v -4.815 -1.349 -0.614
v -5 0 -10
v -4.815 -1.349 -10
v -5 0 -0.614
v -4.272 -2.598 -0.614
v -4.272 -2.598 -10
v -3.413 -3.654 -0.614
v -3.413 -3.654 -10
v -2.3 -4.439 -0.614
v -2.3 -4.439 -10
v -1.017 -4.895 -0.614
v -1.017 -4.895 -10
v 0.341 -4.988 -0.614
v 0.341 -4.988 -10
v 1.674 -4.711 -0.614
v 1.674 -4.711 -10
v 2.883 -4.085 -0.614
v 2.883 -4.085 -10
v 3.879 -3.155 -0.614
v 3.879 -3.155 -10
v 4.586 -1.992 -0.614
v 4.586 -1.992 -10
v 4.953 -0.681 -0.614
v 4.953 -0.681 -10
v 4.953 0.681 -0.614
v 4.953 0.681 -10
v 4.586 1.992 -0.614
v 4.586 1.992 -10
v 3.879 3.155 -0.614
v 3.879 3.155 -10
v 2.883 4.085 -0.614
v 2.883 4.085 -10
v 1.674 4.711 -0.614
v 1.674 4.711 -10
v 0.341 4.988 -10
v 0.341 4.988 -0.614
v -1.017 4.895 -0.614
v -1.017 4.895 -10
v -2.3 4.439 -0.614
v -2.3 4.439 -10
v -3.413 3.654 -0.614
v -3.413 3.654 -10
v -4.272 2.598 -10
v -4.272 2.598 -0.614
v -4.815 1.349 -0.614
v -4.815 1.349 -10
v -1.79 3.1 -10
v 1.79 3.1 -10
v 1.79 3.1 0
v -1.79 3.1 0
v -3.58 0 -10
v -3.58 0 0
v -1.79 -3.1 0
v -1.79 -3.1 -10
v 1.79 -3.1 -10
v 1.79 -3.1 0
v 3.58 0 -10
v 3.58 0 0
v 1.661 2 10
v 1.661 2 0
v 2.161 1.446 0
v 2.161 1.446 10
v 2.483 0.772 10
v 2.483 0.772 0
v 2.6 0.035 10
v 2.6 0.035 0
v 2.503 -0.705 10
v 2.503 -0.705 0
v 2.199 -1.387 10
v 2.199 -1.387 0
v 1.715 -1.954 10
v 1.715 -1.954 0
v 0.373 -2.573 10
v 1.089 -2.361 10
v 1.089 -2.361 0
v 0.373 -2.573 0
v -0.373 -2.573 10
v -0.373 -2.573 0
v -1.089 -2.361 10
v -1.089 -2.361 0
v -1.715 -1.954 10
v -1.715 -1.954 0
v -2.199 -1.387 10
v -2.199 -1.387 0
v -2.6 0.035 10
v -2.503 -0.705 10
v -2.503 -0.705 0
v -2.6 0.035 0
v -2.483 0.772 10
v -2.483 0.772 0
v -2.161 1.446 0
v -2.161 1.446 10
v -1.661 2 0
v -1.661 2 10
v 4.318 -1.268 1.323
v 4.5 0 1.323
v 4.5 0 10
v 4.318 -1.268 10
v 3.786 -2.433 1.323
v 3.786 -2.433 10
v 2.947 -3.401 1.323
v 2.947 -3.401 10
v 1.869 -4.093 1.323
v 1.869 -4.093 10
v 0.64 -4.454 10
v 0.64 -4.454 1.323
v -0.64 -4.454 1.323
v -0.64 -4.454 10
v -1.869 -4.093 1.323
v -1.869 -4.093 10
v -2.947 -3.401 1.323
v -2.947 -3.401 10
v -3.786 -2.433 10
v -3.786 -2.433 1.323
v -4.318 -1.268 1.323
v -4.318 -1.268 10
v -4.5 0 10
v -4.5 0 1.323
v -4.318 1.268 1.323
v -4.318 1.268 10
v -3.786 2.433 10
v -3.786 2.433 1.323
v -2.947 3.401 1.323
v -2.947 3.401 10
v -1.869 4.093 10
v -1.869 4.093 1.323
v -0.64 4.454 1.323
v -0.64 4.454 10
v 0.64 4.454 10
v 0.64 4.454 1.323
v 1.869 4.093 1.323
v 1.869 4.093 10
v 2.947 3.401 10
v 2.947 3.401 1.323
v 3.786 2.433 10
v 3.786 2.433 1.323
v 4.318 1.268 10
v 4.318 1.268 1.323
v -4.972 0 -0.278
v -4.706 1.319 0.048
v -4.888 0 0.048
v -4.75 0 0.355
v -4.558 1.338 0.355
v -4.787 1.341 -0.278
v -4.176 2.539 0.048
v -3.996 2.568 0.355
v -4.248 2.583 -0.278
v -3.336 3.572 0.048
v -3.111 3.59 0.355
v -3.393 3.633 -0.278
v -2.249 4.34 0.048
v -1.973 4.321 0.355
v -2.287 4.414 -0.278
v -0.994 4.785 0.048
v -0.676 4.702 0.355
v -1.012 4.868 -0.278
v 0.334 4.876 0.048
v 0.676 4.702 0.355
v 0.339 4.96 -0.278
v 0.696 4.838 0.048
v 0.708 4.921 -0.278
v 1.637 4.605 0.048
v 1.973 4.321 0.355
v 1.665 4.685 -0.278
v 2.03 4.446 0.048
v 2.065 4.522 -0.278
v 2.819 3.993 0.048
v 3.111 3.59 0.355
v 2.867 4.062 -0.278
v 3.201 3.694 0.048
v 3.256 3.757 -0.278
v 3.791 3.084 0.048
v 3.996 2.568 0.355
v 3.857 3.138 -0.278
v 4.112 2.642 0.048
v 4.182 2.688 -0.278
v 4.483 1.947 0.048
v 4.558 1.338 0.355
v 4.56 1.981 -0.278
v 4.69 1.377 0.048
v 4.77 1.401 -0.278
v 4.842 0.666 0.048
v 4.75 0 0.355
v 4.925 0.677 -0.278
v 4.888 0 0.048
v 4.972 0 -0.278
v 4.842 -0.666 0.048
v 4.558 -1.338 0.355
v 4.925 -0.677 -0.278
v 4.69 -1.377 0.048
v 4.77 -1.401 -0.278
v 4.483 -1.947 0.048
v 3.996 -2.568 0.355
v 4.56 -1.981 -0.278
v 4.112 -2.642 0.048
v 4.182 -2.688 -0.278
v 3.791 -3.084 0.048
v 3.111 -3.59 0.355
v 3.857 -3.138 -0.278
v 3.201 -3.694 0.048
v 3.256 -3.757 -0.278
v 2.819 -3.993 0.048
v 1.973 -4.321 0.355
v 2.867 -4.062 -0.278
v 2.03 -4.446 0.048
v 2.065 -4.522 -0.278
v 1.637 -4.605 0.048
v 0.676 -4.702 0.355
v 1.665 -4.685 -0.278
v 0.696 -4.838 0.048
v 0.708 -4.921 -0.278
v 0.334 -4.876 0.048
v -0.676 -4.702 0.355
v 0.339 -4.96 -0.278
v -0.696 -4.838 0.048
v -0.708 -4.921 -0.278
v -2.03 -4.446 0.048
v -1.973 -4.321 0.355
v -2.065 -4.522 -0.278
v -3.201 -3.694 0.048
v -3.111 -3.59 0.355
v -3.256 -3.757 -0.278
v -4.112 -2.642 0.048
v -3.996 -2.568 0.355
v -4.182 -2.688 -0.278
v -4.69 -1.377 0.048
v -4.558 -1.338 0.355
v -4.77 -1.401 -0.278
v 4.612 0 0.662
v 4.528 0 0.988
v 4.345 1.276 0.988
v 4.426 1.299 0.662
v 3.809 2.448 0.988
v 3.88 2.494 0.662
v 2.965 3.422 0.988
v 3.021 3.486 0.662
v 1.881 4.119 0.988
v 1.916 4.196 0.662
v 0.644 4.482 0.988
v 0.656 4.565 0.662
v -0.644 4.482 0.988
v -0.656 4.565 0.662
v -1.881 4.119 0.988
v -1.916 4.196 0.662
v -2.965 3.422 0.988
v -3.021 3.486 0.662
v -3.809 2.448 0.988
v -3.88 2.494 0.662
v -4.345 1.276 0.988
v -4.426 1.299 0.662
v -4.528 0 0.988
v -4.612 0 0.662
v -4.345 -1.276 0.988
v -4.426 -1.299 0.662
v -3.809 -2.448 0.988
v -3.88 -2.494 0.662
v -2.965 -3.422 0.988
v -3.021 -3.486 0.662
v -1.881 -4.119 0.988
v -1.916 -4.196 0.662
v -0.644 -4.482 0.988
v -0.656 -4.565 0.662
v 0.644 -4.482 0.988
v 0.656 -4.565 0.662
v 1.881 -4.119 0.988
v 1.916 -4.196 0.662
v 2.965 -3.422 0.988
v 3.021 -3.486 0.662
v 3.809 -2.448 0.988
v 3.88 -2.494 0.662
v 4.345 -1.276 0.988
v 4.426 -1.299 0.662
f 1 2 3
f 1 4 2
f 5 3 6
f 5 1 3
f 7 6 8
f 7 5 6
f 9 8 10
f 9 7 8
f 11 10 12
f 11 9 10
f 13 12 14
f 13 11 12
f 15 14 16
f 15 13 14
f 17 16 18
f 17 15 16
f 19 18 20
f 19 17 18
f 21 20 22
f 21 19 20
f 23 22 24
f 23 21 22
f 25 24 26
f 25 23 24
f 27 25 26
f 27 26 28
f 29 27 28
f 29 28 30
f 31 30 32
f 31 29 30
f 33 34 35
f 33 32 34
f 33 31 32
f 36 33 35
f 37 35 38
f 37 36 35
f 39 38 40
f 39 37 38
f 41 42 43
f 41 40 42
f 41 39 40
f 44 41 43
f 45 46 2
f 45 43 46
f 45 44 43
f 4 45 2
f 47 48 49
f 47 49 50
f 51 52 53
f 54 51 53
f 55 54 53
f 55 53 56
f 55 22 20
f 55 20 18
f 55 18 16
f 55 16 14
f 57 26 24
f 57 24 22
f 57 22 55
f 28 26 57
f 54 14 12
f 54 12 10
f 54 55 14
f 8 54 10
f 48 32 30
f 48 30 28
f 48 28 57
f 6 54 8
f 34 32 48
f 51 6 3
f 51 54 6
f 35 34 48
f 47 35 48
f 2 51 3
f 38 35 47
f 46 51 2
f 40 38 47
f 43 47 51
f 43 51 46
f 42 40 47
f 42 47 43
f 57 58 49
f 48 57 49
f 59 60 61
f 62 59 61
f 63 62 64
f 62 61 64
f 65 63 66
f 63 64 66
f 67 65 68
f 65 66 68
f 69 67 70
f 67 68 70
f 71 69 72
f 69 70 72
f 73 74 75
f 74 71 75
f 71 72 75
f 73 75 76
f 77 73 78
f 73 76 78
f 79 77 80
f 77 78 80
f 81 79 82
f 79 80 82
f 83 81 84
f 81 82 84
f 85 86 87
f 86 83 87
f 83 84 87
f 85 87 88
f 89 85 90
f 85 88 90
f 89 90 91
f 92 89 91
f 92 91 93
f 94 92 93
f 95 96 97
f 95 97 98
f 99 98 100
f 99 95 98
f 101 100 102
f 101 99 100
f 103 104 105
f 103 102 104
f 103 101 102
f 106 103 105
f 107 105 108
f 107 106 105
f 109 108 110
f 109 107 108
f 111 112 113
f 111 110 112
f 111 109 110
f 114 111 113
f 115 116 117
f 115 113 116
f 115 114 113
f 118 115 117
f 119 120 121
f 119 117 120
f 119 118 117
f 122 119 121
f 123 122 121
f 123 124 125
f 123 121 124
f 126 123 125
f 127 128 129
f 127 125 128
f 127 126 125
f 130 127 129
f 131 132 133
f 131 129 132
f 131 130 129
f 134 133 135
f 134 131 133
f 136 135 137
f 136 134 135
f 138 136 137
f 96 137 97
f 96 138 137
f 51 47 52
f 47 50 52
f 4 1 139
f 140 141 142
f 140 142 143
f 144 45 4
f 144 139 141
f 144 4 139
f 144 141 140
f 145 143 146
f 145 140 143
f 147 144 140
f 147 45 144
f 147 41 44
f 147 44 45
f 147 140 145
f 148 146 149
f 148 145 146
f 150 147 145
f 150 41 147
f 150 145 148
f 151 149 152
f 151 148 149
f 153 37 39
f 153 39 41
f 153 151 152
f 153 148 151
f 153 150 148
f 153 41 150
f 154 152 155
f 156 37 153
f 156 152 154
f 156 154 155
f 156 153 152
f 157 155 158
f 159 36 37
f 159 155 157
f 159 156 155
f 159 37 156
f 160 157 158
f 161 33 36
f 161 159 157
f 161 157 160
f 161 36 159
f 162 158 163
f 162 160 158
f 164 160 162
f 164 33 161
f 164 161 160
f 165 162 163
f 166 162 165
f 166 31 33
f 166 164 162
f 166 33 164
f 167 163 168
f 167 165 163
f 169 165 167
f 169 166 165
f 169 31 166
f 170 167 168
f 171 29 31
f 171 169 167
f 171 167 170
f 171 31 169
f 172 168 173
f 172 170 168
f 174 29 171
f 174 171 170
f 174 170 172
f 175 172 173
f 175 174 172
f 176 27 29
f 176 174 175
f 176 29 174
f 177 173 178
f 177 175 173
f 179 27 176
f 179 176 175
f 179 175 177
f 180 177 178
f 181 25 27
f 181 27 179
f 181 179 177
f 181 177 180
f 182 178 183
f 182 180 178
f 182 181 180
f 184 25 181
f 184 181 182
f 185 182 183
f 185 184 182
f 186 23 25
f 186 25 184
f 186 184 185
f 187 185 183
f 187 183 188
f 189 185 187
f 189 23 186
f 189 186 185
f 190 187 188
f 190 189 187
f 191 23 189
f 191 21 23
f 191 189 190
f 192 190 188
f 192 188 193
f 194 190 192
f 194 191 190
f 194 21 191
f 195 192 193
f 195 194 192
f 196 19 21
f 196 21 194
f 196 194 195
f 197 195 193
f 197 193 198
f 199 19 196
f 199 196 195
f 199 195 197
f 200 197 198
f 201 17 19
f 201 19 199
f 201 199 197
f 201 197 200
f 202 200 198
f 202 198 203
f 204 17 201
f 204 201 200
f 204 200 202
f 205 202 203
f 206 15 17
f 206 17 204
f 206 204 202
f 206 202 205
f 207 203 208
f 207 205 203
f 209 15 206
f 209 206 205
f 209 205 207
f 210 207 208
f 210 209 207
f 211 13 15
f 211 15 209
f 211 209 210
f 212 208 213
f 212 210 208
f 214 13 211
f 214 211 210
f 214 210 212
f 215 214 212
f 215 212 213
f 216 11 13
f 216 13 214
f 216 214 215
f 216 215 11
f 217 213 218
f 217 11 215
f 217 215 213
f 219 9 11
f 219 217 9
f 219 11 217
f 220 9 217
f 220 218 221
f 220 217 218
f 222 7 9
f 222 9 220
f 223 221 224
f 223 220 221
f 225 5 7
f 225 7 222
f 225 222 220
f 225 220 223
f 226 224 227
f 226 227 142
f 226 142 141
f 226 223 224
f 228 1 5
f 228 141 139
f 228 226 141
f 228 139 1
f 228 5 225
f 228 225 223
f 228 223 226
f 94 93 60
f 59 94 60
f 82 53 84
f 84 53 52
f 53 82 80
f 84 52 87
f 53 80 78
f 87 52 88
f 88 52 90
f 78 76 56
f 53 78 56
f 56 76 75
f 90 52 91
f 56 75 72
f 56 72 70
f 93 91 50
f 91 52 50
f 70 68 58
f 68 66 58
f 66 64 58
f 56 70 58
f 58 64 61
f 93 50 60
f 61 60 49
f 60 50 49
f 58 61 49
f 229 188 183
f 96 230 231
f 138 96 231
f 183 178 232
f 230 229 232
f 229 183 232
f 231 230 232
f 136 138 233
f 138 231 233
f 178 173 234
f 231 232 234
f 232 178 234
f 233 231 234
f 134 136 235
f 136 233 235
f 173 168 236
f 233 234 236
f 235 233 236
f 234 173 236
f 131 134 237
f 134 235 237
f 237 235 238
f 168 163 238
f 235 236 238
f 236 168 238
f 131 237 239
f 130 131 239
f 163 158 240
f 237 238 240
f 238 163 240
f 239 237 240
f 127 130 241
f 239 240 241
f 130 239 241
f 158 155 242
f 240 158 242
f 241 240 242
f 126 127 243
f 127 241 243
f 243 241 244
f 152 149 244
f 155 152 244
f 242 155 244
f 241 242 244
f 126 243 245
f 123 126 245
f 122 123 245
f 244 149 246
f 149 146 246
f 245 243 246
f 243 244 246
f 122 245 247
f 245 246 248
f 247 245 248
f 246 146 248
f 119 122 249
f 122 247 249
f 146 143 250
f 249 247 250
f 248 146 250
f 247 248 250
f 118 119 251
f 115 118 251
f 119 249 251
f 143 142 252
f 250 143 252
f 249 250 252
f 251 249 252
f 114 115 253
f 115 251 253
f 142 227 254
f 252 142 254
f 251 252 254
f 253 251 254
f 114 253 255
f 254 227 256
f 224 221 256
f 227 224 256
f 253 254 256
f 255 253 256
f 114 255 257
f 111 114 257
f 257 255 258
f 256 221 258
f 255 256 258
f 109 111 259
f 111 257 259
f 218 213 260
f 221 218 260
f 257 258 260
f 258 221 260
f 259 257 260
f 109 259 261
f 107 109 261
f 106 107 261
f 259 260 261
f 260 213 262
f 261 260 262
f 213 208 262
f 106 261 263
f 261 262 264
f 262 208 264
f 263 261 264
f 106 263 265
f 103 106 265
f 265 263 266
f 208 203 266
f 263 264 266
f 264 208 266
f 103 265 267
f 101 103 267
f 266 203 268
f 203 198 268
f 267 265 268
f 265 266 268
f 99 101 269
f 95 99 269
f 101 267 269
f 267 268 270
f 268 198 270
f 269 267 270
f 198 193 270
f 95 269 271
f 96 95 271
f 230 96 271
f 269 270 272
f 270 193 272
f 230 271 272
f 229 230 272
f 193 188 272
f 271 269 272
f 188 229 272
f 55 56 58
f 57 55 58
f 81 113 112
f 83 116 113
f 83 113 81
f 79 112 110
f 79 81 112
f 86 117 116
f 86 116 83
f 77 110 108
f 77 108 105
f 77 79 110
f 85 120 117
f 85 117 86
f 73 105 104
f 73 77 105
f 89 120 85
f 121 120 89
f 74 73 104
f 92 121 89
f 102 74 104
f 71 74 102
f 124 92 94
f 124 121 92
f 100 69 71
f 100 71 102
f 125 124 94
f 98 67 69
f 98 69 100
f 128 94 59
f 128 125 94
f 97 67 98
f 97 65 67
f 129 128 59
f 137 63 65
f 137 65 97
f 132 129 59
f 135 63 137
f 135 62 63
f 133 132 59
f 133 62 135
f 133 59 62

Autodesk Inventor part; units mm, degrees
ref_plane "YZ Plane" through (0, 0, 0) normal (1, 0, 0) x (0, 1, 0)
ref_plane "XZ Plane" through (0, 0, 0) normal (0, 1, 0) x (-1, 0, 0)
ref_plane "XY Plane" through (0, 0, 0) normal (0, 0, 1) x (1, 0, 0)
sketch "Sketch1" plane through (0, 0, 0) normal (0, 0, 1) x (1, 0, 0)
  arc A0 (-1.6613, 2) -> (1.6613, 2) centre (0, 0) ccw
  line L0 (-1.6613, 2) -> (1.6613, 2)
  circle A1 centre (0, 0) radius 4.5
  dimension "d0" = 5.2
  dimension "d1" = 4.6
  dimension "d2" = 9
extrude "Extrusion1" add sketch "Sketch1" along normal blind 10
sketch "Sketch2" plane through (0, 0, 0) normal (0, 0, -1) x (-1, 0, 0)
  line L0 (1.7898, 3.1) -> (3.5796, 0)
  line L1 (3.5796, 0) -> (1.7898, -3.1)
  line L2 (1.7898, -3.1) -> (-1.7898, -3.1)
  line L3 (-1.7898, -3.1) -> (-3.5796, 0)
  line L4 (-3.5796, 0) -> (-1.7898, 3.1)
  line L5 (-1.7898, 3.1) -> (1.7898, 3.1)
  circle A0 centre (0, 0) radius 5
  dimension "d5" = 6.2
  dimension "d6" = 10
extrude "Extrusion2" add sketch "Sketch2" along normal blind 10
fillet "Fillet1" radius 2 2 edges at (-4.5, 0, 0) (5, 0, 0)
properties part number "Motor to hex coupler"
